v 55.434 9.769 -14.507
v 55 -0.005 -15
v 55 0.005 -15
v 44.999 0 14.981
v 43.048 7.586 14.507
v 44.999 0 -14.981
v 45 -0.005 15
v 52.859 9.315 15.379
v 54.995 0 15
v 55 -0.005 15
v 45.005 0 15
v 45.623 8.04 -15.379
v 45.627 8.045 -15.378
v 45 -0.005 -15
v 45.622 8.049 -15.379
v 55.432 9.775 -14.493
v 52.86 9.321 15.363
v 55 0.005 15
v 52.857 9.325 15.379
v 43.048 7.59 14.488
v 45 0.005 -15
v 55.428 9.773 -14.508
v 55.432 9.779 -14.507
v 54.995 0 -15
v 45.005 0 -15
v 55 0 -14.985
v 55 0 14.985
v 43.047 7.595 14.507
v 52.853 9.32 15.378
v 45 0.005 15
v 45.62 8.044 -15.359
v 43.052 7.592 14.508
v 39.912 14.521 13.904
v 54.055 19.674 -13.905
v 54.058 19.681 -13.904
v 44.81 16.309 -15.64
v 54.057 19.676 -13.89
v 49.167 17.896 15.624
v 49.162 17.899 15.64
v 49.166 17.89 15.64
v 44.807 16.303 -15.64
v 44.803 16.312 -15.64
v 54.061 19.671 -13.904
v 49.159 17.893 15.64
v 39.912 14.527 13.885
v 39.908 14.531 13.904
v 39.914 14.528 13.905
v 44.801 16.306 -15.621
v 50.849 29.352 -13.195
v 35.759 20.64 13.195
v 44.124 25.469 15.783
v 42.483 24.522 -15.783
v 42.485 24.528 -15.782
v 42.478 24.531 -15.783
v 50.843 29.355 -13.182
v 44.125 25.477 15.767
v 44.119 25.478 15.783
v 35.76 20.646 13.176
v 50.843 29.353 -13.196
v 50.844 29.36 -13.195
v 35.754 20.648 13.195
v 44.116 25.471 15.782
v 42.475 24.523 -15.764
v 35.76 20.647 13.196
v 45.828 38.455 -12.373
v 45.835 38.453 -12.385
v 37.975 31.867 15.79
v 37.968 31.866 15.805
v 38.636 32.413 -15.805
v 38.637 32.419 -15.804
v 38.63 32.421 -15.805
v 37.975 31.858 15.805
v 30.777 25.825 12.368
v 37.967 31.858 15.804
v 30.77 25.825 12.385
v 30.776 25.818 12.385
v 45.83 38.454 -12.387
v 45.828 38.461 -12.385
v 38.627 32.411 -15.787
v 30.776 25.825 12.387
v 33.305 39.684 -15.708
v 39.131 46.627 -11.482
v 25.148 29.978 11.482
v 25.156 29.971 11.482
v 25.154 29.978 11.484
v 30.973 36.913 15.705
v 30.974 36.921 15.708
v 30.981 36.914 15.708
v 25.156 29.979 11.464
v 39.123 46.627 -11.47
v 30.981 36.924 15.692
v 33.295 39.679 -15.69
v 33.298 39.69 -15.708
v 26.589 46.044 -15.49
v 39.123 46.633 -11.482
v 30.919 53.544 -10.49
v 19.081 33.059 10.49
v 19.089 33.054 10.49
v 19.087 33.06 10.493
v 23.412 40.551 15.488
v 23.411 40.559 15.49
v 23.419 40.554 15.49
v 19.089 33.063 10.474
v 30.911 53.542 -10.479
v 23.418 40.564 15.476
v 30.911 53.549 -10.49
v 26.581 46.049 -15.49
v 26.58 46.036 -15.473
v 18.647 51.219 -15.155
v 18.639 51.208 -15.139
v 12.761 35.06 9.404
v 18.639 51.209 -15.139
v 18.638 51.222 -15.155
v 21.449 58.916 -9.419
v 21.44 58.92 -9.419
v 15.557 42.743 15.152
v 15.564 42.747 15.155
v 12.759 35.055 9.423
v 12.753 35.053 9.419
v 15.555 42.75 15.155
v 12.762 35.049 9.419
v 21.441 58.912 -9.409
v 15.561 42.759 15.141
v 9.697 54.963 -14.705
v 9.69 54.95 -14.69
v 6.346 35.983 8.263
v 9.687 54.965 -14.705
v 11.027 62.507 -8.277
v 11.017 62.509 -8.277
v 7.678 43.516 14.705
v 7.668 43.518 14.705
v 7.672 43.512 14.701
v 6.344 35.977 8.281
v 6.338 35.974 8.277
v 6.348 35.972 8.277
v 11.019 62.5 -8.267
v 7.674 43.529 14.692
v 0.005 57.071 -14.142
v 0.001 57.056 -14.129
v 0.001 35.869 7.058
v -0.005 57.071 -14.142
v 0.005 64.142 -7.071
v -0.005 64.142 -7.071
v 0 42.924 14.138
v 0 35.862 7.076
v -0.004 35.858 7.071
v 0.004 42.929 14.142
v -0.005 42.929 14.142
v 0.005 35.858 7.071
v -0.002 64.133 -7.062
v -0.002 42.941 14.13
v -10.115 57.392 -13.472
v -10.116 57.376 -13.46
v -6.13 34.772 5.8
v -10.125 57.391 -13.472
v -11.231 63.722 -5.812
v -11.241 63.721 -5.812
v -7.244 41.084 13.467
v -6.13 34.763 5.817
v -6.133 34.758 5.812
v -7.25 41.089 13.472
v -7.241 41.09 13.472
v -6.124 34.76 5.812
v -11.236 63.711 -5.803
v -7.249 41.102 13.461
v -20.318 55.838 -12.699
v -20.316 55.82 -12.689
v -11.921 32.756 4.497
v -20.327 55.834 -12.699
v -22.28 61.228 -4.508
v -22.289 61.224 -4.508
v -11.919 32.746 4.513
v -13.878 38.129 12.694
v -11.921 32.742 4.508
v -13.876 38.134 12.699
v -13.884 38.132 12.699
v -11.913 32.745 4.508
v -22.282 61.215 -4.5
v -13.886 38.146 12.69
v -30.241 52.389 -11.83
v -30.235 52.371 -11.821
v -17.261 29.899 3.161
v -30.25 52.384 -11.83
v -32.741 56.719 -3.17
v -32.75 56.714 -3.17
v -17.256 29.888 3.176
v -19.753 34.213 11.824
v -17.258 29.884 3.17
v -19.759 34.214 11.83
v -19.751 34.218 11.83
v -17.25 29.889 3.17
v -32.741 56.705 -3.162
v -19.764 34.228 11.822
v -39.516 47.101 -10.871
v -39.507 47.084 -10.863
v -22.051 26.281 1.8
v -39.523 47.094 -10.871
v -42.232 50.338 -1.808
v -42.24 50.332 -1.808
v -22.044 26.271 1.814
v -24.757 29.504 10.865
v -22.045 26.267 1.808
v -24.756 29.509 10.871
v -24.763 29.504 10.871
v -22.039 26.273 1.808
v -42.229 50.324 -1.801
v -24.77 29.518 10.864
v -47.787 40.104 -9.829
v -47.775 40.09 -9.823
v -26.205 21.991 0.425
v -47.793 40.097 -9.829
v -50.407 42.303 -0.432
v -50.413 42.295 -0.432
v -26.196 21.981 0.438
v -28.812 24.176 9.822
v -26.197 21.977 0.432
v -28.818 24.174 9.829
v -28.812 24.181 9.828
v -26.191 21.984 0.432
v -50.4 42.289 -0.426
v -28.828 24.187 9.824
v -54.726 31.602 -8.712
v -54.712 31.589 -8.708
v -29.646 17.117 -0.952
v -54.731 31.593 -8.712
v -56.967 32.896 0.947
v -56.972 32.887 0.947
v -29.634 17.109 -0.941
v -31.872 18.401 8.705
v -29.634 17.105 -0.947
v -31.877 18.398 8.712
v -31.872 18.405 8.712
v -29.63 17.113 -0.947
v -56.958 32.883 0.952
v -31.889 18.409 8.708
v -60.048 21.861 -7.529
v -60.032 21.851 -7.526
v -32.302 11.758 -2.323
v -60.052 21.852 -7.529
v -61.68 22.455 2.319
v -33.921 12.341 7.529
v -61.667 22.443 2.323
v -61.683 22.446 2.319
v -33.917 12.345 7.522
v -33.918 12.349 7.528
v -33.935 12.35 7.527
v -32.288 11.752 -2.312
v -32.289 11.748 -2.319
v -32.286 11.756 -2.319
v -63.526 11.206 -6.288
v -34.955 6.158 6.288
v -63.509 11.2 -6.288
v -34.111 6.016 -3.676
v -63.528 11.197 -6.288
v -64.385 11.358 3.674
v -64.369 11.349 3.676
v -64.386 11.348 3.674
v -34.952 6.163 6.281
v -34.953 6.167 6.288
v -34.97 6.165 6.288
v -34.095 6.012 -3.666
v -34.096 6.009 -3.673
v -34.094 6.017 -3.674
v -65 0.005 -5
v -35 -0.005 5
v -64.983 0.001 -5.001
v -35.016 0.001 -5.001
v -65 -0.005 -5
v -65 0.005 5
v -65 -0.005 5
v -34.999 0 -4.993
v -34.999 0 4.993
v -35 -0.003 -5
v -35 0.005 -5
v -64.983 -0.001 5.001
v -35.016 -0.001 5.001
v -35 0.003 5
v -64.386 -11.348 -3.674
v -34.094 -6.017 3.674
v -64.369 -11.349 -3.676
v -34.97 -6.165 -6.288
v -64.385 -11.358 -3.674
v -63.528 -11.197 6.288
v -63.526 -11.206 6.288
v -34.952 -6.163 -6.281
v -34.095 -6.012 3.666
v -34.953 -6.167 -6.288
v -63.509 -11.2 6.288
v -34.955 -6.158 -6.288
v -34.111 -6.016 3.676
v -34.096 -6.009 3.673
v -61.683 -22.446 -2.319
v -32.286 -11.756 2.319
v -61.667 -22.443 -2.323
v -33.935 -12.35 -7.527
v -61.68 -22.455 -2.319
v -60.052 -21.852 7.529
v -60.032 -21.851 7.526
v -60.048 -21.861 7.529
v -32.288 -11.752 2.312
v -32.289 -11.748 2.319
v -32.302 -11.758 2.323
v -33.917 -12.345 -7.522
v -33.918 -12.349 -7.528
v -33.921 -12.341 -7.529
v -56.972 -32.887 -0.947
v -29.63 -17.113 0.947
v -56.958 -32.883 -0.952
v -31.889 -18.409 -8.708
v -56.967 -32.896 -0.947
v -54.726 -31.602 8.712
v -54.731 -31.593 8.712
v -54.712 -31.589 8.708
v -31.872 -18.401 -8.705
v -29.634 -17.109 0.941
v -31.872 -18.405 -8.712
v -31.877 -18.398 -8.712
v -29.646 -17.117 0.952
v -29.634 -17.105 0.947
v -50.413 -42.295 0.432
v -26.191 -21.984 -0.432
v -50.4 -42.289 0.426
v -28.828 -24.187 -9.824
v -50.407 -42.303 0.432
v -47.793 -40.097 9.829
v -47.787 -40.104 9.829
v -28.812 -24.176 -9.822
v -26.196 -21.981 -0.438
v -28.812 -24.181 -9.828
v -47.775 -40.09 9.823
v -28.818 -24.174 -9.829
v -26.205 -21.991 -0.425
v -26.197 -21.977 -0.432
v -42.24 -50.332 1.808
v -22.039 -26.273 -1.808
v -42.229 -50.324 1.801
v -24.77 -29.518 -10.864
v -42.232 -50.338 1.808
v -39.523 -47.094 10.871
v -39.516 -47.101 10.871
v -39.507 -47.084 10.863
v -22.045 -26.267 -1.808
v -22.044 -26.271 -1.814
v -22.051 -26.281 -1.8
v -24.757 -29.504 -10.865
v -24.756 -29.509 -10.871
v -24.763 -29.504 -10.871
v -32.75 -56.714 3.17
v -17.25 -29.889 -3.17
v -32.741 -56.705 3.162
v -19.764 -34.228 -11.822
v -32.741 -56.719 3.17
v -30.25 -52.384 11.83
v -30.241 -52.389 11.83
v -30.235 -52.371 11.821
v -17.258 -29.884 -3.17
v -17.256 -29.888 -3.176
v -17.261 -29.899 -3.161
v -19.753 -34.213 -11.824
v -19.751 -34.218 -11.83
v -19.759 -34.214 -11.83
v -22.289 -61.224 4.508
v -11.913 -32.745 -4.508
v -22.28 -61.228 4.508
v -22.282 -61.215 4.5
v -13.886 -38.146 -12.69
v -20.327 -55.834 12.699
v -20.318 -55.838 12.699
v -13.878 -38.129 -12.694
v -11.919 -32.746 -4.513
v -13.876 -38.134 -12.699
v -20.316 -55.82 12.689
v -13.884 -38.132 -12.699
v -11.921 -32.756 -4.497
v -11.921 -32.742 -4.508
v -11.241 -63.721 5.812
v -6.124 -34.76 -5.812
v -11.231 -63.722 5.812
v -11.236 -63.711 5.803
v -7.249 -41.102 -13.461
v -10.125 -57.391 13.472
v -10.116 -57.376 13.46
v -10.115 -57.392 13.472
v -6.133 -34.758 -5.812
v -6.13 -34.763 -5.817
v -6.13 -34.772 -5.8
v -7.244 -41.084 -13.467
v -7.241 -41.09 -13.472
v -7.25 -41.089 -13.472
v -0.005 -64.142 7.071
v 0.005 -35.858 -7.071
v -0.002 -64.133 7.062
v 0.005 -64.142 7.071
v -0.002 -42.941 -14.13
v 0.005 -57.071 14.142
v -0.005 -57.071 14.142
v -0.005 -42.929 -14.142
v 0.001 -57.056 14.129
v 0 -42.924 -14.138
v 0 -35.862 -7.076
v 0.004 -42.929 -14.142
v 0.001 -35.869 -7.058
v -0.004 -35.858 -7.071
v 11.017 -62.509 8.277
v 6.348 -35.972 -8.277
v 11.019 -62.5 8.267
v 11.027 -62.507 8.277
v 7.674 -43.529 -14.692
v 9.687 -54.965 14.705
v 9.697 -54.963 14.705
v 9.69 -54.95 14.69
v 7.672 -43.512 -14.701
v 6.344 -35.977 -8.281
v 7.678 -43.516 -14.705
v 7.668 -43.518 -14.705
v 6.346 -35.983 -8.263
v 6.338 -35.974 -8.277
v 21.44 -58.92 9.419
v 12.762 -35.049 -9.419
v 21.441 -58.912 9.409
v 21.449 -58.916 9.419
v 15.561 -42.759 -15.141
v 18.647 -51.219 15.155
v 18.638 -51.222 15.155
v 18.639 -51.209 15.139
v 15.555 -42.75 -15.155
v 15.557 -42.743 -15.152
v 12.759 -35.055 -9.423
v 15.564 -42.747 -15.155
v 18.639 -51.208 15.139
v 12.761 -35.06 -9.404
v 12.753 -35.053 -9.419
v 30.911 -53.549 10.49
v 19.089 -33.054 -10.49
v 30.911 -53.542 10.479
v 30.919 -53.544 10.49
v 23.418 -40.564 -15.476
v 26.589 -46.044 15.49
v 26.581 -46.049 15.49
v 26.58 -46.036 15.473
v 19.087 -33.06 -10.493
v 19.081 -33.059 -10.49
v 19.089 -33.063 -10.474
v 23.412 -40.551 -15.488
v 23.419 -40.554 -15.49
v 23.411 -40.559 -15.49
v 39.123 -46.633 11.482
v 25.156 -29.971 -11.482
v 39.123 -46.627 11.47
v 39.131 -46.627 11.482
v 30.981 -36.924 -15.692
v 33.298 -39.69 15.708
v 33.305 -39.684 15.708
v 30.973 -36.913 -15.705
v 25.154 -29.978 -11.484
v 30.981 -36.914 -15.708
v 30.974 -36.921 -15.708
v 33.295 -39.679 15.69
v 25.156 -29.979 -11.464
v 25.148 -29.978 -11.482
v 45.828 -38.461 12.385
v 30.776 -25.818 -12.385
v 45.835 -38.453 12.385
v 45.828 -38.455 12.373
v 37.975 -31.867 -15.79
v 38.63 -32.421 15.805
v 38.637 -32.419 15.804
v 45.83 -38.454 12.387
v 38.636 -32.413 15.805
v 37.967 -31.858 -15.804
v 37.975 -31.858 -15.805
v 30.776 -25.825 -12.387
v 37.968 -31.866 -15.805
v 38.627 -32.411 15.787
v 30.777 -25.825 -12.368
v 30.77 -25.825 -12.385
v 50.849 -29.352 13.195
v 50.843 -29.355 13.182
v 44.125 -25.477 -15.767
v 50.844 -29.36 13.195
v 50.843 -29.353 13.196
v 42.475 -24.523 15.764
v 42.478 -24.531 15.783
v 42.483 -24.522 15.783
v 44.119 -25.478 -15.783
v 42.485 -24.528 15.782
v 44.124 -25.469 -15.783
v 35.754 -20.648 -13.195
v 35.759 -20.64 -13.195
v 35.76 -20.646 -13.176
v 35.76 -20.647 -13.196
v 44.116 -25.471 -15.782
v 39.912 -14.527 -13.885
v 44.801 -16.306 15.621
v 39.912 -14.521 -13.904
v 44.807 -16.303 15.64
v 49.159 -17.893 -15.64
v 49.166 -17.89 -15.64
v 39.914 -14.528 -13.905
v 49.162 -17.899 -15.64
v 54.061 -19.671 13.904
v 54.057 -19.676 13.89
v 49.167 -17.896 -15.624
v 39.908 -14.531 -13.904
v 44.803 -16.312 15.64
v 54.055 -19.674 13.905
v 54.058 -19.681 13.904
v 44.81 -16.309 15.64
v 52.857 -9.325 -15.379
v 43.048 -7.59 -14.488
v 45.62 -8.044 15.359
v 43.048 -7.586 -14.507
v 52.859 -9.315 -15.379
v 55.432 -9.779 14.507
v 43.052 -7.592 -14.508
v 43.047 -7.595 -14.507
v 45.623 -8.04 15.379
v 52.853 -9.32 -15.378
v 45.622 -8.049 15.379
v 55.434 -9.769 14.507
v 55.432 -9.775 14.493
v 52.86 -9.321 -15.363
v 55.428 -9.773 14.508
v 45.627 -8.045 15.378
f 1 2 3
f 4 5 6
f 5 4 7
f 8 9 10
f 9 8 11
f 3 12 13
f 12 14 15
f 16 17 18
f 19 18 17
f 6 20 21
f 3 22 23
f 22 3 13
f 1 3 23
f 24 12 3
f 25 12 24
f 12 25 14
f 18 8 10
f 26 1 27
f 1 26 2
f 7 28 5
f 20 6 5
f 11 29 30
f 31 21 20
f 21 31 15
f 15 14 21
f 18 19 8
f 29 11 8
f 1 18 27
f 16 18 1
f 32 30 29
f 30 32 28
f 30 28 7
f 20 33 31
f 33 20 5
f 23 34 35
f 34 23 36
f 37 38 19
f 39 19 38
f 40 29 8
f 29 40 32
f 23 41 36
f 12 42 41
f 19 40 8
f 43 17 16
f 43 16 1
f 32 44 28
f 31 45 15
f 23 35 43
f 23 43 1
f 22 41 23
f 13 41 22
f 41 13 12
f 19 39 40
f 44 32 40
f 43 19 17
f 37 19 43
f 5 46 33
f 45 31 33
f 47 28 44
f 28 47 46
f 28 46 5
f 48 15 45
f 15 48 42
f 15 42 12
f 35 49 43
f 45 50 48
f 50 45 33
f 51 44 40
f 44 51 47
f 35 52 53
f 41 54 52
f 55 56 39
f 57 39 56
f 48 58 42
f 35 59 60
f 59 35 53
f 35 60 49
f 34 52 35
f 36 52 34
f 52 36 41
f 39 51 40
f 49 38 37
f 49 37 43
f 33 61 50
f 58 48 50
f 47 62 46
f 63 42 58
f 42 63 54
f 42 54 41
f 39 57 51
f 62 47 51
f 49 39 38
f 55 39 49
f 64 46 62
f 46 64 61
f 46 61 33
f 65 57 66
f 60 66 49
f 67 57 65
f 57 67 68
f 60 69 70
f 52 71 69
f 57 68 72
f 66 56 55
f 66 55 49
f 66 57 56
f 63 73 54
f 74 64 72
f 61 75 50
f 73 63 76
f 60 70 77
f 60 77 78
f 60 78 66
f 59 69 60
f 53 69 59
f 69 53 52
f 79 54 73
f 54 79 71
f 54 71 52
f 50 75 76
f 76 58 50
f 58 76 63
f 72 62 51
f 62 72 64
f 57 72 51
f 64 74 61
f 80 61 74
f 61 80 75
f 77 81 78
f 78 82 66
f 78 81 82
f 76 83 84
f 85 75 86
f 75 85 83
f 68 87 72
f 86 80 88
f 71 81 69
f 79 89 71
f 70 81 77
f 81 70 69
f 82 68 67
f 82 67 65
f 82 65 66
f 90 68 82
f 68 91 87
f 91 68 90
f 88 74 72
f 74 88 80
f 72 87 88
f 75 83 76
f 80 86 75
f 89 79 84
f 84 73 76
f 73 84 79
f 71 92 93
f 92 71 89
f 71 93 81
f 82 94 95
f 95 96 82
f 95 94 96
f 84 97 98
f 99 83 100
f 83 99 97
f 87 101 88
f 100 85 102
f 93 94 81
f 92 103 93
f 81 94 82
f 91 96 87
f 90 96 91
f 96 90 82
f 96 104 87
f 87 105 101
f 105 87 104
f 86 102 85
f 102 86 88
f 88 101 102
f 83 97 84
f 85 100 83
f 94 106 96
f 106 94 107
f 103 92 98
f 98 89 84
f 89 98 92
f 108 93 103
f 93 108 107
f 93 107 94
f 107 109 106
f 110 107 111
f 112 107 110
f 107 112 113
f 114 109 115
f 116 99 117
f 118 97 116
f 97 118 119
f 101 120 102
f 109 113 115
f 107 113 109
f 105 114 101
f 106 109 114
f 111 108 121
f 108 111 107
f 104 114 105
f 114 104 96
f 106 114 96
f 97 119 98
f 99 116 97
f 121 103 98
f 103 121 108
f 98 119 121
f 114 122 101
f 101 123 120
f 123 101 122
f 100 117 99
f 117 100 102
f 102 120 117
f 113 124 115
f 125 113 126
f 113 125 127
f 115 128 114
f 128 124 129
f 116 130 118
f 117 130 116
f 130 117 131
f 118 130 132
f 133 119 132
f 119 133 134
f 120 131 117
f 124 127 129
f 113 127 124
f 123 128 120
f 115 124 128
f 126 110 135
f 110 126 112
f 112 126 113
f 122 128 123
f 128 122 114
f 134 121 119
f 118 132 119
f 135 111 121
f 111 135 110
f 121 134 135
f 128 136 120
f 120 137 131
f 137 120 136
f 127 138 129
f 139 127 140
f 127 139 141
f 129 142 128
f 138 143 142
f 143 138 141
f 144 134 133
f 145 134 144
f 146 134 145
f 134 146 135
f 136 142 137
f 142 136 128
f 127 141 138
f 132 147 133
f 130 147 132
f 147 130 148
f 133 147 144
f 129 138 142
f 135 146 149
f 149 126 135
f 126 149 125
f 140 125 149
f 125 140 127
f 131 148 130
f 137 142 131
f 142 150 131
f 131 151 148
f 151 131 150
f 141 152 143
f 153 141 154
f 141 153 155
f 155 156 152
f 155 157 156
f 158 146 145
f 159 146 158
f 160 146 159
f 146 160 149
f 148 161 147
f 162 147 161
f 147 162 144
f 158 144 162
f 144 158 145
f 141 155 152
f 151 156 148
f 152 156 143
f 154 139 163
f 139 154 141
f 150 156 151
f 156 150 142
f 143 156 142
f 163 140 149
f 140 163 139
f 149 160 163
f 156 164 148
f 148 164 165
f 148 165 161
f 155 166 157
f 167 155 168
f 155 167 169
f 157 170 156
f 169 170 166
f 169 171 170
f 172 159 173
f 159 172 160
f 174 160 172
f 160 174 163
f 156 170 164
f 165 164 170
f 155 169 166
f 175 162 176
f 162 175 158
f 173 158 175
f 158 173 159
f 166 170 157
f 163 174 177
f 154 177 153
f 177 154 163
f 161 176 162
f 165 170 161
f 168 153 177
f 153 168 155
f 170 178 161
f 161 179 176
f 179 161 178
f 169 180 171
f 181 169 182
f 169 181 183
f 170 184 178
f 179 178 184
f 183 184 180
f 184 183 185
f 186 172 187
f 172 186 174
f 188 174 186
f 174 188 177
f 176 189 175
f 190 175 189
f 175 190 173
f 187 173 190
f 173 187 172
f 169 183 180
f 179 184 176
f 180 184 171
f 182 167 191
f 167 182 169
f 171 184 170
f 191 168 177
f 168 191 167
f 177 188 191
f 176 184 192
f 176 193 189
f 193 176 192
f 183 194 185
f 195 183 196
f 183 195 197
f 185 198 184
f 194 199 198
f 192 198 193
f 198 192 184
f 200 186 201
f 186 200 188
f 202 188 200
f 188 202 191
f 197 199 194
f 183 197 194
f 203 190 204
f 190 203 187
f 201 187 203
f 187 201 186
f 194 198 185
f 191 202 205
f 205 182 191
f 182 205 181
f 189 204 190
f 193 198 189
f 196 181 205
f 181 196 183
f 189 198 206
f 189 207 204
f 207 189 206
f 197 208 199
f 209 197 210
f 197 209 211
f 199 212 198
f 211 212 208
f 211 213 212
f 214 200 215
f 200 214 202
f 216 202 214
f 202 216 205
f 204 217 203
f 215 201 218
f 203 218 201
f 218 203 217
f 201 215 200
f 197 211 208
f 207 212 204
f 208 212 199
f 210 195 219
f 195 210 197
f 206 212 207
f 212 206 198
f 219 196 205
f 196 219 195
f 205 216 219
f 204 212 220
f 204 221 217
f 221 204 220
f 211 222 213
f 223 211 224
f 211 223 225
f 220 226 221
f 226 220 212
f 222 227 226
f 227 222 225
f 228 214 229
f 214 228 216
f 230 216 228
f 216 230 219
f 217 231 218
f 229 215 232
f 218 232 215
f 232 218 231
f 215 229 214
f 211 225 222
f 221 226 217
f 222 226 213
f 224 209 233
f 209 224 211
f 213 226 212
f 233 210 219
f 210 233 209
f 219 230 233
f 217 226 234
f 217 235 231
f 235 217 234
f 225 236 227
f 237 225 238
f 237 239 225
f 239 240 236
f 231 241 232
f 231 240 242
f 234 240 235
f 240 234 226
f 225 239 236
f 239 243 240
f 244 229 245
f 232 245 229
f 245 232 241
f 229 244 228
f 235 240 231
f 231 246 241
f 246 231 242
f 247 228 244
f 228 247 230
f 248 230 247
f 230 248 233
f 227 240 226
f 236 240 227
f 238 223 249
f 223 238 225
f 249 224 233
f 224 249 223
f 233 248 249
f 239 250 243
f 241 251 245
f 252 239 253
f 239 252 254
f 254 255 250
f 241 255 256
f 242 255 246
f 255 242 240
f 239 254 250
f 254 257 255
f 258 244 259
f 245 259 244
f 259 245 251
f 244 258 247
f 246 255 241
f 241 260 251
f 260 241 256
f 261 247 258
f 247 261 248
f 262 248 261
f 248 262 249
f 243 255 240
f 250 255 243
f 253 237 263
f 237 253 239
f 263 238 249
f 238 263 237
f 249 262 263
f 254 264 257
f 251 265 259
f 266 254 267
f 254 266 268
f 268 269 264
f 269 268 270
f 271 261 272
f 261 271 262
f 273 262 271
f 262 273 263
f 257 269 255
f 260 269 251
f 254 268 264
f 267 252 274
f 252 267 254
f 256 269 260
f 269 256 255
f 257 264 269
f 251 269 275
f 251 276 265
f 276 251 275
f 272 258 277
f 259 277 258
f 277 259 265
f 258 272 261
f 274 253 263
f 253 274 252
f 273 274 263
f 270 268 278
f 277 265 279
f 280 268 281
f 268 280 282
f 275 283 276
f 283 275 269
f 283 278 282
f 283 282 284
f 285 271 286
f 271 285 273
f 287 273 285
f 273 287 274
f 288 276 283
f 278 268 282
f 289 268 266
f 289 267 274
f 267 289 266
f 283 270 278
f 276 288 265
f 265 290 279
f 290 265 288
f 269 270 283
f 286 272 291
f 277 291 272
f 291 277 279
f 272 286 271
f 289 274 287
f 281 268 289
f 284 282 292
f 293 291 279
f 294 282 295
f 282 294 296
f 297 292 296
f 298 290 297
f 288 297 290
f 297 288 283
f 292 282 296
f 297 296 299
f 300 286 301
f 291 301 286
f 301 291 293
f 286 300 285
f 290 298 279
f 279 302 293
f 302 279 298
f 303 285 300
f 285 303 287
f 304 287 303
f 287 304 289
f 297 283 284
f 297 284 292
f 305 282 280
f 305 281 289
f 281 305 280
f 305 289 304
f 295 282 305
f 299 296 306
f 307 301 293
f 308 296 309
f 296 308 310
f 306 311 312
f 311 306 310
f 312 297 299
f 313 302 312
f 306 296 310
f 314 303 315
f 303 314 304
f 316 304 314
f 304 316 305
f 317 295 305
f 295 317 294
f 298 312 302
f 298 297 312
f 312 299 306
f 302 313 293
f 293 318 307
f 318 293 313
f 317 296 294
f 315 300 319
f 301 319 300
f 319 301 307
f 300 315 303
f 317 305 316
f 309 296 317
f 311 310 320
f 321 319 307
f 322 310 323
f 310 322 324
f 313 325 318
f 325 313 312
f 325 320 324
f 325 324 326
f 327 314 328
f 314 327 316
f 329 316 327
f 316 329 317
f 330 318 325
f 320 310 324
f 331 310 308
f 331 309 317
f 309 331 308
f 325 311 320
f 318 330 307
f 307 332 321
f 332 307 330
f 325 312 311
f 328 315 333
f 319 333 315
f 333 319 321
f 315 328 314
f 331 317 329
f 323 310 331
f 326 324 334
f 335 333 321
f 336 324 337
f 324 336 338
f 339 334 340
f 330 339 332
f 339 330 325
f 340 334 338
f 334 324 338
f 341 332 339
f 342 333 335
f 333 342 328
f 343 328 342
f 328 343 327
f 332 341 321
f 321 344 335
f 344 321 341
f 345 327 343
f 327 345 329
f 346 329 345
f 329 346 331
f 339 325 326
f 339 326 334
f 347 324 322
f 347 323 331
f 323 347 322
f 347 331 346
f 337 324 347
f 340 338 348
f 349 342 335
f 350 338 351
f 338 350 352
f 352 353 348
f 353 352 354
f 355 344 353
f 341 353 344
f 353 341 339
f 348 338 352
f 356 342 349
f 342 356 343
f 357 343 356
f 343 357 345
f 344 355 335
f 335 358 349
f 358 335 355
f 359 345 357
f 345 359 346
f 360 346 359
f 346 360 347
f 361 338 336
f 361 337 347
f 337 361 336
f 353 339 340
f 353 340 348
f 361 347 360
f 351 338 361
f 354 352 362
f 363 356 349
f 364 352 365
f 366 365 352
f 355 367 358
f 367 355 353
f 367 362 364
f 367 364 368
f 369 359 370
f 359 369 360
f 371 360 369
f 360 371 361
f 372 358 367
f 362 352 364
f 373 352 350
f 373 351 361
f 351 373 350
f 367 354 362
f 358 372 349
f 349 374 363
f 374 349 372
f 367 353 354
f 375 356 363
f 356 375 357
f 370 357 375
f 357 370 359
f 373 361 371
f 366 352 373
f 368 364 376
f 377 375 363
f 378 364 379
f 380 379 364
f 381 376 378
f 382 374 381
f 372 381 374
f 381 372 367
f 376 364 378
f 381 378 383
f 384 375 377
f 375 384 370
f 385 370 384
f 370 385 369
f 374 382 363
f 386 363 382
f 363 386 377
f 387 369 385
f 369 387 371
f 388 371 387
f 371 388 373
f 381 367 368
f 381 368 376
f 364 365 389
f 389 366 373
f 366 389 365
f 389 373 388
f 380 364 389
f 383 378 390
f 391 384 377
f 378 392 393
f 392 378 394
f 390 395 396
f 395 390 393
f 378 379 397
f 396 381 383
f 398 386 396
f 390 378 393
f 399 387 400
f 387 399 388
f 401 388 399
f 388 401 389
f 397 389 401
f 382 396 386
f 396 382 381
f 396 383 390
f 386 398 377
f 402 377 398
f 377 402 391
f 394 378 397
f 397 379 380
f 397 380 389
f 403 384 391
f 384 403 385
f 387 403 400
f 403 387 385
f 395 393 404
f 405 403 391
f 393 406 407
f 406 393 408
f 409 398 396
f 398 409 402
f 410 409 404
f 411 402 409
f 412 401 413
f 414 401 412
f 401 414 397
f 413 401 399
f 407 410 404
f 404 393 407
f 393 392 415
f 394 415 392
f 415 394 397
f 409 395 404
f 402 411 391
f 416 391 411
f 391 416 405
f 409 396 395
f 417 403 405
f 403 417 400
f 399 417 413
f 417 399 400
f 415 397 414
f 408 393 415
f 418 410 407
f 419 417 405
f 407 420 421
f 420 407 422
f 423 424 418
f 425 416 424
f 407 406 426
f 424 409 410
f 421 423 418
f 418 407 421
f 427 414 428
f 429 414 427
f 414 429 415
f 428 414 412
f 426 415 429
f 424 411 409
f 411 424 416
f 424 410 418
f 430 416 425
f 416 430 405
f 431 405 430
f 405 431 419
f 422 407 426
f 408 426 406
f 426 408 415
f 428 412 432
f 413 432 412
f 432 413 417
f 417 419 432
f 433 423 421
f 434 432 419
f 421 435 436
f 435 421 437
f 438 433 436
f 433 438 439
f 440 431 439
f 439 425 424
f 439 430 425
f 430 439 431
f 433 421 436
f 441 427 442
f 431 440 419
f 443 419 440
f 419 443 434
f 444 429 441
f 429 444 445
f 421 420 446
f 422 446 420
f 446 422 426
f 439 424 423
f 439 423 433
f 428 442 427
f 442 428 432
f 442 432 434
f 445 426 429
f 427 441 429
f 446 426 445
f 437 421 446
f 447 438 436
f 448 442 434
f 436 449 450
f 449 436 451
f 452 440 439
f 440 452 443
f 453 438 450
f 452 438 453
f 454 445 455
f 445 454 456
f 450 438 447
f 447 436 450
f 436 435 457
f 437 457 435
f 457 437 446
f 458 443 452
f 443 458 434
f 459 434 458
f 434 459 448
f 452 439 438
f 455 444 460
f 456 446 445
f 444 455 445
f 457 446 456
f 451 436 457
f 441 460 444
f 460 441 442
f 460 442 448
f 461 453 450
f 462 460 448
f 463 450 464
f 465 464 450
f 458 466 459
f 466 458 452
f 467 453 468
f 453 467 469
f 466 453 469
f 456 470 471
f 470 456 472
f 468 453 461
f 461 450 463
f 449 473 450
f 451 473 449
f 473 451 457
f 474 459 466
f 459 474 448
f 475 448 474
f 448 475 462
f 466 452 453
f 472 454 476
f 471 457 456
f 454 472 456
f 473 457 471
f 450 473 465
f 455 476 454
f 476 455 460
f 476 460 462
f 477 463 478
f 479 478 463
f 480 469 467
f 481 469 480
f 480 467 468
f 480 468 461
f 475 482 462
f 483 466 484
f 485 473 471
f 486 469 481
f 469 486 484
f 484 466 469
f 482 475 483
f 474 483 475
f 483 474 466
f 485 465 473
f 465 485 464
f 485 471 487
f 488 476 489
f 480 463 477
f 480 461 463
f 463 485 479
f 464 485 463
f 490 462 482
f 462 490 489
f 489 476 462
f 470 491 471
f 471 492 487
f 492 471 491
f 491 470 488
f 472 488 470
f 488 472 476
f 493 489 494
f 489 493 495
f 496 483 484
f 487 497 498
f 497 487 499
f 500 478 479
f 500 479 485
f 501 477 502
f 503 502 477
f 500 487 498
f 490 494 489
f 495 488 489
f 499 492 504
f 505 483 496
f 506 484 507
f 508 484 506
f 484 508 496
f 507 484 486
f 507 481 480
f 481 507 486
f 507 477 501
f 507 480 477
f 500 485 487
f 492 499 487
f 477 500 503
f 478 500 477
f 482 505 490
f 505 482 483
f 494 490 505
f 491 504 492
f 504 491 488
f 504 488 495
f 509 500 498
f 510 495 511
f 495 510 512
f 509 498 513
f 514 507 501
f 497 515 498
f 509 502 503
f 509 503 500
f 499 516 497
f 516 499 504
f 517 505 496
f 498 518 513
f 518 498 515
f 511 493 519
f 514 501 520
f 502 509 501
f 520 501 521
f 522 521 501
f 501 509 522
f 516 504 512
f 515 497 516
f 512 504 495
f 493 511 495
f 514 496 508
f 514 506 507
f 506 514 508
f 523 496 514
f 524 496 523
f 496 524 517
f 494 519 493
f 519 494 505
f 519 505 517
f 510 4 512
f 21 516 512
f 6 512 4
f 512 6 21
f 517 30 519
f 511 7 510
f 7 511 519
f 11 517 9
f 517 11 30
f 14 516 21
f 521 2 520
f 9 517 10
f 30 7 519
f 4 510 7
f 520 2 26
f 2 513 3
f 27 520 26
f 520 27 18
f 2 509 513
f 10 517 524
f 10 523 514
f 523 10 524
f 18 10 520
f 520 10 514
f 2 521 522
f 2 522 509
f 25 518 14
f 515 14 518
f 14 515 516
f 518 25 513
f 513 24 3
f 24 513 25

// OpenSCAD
// Create an equivalent for rotate_extrude that does spirals
// This also allows sweeping of an angle, as that is only supported on
// versions after 2015.03, of which there are none
// Creative Commons - Attribution - Share Alike License
// http://creativecommons.org/licenses/by-sa/3.0/

/* [Parameters] */
// Angle to sweep through
angle = 720;
// Amount to offset the spiral over the entire sweep
offset = 50;
// Radius of sweep rotation
spiral_radius = 50;
// Scale radius during sweep
scale_radius = 1.5;
// Width of shape
shape_width = 10;
// Scale shape during sweep
scale_shape = 2.0;
// Twist shape during sweep
twist_angle = 720;
// Shape to extrude
join_type = "union"; // [union:Join child shapes,difference:Subtract later child shapes from the first one,intersection:Find the intersection of thechild shapes]
shape = "moebius"; // [semicircle:Semicircle(demonstrates intersection),square:Square(simple shape),diamond:Diamond(demonstrates simple rotated shape),tube:Tube(demonstrates difference),moebius:Moebius strip,ouroboros:Tube that swallows itself(unprintable but fun),spring:Spring(complex example),custom:Custom shape]
/* [Spring] */
// Diameter of Spring
spring_diameter = 30;
// Length of Spring
spring_length = 100;
// Diameter of Spring wire
spring_wire_diameter = 5;
// Number of close-packed coils at each end
spring_end_coils = 1.5;
// Spacing of middle coils (Approximate)
spring_spacing = 15;
/* [Custom] */
// Custom shape
custom_polygon = [[[-4,-4],[-4,4],[4,4],[4,-4]],[[0,1,2,3]]]; // [draw_polygon:10x10]

/* [Hidden] */
outer_circularity = 36;
inner_circularity = 12;

maxValue = 10000;

if (shape == "ouroboros") {
  rotate_extrude_helix(angle = 720, radius = spiral_radius, scaleRadius = 1, scaleShape = 8, twistAngle = 0, offset = 0, center = false, joinType = "difference") {
    circle(r = shape_width / 2);
    circle(r = shape_width / 2.5);
  }
} else if (shape == "spring") {
  shape_spring(diameter = spring_diameter, wireDiameter = spring_wire_diameter, length = spring_length, endCoils = spring_end_coils, coilSpacing = spring_spacing);
} else if (shape == "semicircle") {
  rotate_extrude_helix(angle = angle, radius = spiral_radius, scaleRadius = scale_radius, scaleShape = scale_shape, twistAngle = twist_angle, offset = offset, center = false, joinType = "intersection") {
    circle(r = shape_width / 2);
    translate([shape_width / 2, 0, 0]) {
      square(size = shape_width, center = true);
    }
  }
} else if (shape == "circle") {
  rotate_extrude_helix(angle = angle, radius = spiral_radius, scaleRadius = scale_radius, scaleShape = scale_shape, twistAngle = twist_angle, offset = offset, center = false, joinType = join_type) {
    circle(r = shape_width / 2);
  }
} else if (shape == "moebius") {
  rotate_extrude_helix(angle = 360, radius = spiral_radius, twistAngle = 180, center = false, joinType = join_type) {
    square(size = [shape_width, 3 * shape_width], center = true);
  }
} else if (shape == "square") {
  rotate_extrude_helix(angle = angle, radius = spiral_radius, scaleRadius = scale_radius, scaleShape = scale_shape, twistAngle = twist_angle, offset = offset, center = false, joinType = join_type) {
    square(size = shape_width, center = true);
  }
} else if (shape == "cross") {
  rotate_extrude_helix(angle = angle, radius = spiral_radius, scaleRadius = scale_radius, scaleShape = scale_shape, twistAngle = twist_angle, offset = offset, center = false, joinType = join_type) {
    square(size = [shape_width, shape_width / 3], center = true);
    square(size = [shape_width / 3, shape_width], center = true);
  }
} else if (shape == "diamond") {
  rotate_extrude_helix(angle = angle, radius = spiral_radius, scaleRadius = scale_radius, scaleShape = scale_shape, twistAngle = twist_angle, offset = offset, center = false, joinType = join_type) {
    rotate([0, 0, 45]) {
      square(size = shape_width / sqrt(2), center = true);
    }
  }
} else if (shape == "custom") {
  rotate_extrude_helix(angle = angle, radius = spiral_radius, scaleRadius = scale_radius, scaleShape = scale_shape, twistAngle = twist_angle, offset = offset, center = false, joinType = join_type) {
    for(poly = [custom_polygon[1]]) {
      polygon(custom_polygon[0], poly);
    }
  }
} else if (shape == "tube") {
  rotate_extrude_helix(angle = angle, radius = spiral_radius, scaleRadius = scale_radius, scaleShape = scale_shape, twistAngle = twist_angle, offset = offset, center = false, joinType = "difference") {
    circle(r = shape_width / 2);
    circle(r = shape_width / 2.5);
  }
}

module segment(radius, segmentIndex, deltaAngle, deltaOffset, deltaScaleShape, deltaScaleRadius, deltaTwistAngle, subtract = false) {
  angle1 = segmentIndex * deltaAngle - (subtract ? 0.01 : 0);
  offset1 = segmentIndex * deltaOffset;
  scaledRadius1 = (1.0 + segmentIndex * deltaScaleRadius) * radius;
  scaledScale1 = 1.0 + segmentIndex * deltaScaleShape;
  scaledTwist1 = segmentIndex * deltaTwistAngle;
  angle2 = (segmentIndex + 1) * deltaAngle + (subtract ? 0.01 : 0);
  offset2 = (segmentIndex + 1) * deltaOffset;
  scaledRadius2 = (1.0 + (segmentIndex + 1) * deltaScaleRadius) * radius;
  scaledScale2 = 1.0 + (segmentIndex + 1) * deltaScaleShape;
  scaledTwist2 = (segmentIndex + 1) * deltaTwistAngle;
  hull() {
    translate([0, 0, offset1]) {
      rotate([0, 0, angle1]) {
        rotate([90, 0, 0]) {
          linear_extrude(height = .01, center = true) {
            translate([scaledRadius1, 0, 0]) {
              scale([scaledScale1, scaledScale1, 1]) {
                rotate([0, 0, scaledTwist1]) {
                  children();
                }
              }
            }
          }
        }
      }
    }
    translate([0, 0, offset2]) {
      rotate([0, 0, angle2]) {
        rotate([90, 0, 0]) {
          linear_extrude(height = .01, center = true) {
            translate([scaledRadius2, 0, 0]) {
              scale([scaledScale2, scaledScale2, 1]) {
                rotate([0, 0, scaledTwist2]) {
                  children();
                }
              }
            }
          }
        }
      }
    }
  }
}

module rotate_extrude_helix(angle = 360, radius = 0, offset = 0, scaleShape = 1.0, scaleRadius = 1.0, twistAngle = 0, center = false, $fn = outer_circularity, joinType = "union") {
  n = max(2, ceil($fn * abs(angle) / 360));
 
  deltaAngle = angle / n;
  deltaTwistAngle = twistAngle / n;
  deltaOffset = offset / n;
  deltaScaleRadius = (scaleRadius - 1.0) / n;
  deltaScaleShape = (scaleShape - 1.0) / n;

  translate([0, 0, center ? -offset / 2 : 0]) {
    union() {
      if ($children > 0) {
        for (i = [0 : n - 1]) {
          if (joinType == "difference") {
            difference() {
              segment(radius, segmentIndex = i, deltaAngle = deltaAngle, deltaOffset = deltaOffset, deltaScaleShape = deltaScaleShape, deltaScaleRadius = deltaScaleRadius, deltaTwistAngle = deltaTwistAngle) {
                children(0);
              }
              if ($children > 1) {
                for (childIndex = [1 : $children - 1]) {
                  segment(radius, segmentIndex = i, deltaAngle = deltaAngle, deltaOffset = deltaOffset, deltaScaleShape = deltaScaleShape, deltaScaleRadius = deltaScaleRadius, deltaTwistAngle = deltaTwistAngle, subtract = true) {
                    children(childIndex);
                  }
                }
              }
            }
          } else if (joinType == "intersection") {
            intersection_for(childIndex = [0 : $children - 1]) {
              segment(radius, segmentIndex = i, deltaAngle = deltaAngle, deltaOffset = deltaOffset, deltaScaleShape = deltaScaleShape, deltaScaleRadius = deltaScaleRadius, deltaTwistAngle = deltaTwistAngle) {
                children(childIndex);
              }
            }
          } else {
            union() {
              for (childIndex = [0 : $children - 1]) {
                segment(radius, segmentIndex = i, deltaAngle = deltaAngle, deltaOffset = deltaOffset, deltaScaleShape = deltaScaleShape, deltaScaleRadius = deltaScaleRadius, deltaTwistAngle = deltaTwistAngle) {
                  children(childIndex);
                }
              }
            }
          }
        }
      }
    }
  }
}

module shape_spring(diameter, wireDiameter, length, endCoils, coilSpacing) {
  radius = diameter / 2;
  wireRadius = wireDiameter / 2;
  endSpacing = wireDiameter + .1;
  endLength = endCoils * endSpacing;
  tryCoilLength = length - endLength * 2;
  coils = max(1, floor(tryCoilLength / coilSpacing) - 1);
  coilLength = coils * coilSpacing;
  transitionLength = (length - coilLength) / 2 - endLength;
  transitionCoils = 2;
  transitionSpacing = transitionLength / transitionCoils;

  intersection() {
    union() {
      rotate_extrude_helix(angle = endCoils * 360 + .01, radius = radius, offset = endLength, center = false) {
        circle(r = wireRadius, $fn = inner_circularity);
      }
      translate([0, 0, endLength]) {
        rotate([0, 0, endCoils * 360]) {
          rotate_extrude_helix(angle = transitionCoils * 360 + .01, radius = radius, offset = transitionLength, center = false) {
            circle(r = wireRadius, $fn = inner_circularity);
          }
        }
      }
      translate([0, 0, endLength + transitionLength]) {
        rotate([0, 0, (endCoils + transitionCoils) * 360]) {
          rotate_extrude_helix(angle = coils * 360 + .01, radius = radius, offset = coilLength, center = false) {
            circle(r = wireRadius, $fn = inner_circularity);
          }
        }
      }
      translate([0, 0, endLength + transitionLength + coilLength]) {
        rotate([0, 0, (endCoils + transitionCoils + coils) * 360]) {
          rotate_extrude_helix(angle = transitionCoils * 360 + .01, radius = radius, offset = transitionLength, center = false) {
            circle(r = wireRadius, $fn = inner_circularity);
          }
        }
      }
      translate([0, 0, endLength + 2 * transitionLength + coilLength]) {
        rotate([0, 0, (endCoils + 2 * transitionCoils + coils) * 360]) {
          rotate_extrude_helix(angle = endCoils * 360, radius = radius, offset = endLength, center = false) {
            circle(r = wireRadius, $fn = inner_circularity);
          }
        }
      }
    }
    translate([0, 0, length / 2]) {
      cube([maxValue, maxValue, length], center = true);
    }
  }
}
